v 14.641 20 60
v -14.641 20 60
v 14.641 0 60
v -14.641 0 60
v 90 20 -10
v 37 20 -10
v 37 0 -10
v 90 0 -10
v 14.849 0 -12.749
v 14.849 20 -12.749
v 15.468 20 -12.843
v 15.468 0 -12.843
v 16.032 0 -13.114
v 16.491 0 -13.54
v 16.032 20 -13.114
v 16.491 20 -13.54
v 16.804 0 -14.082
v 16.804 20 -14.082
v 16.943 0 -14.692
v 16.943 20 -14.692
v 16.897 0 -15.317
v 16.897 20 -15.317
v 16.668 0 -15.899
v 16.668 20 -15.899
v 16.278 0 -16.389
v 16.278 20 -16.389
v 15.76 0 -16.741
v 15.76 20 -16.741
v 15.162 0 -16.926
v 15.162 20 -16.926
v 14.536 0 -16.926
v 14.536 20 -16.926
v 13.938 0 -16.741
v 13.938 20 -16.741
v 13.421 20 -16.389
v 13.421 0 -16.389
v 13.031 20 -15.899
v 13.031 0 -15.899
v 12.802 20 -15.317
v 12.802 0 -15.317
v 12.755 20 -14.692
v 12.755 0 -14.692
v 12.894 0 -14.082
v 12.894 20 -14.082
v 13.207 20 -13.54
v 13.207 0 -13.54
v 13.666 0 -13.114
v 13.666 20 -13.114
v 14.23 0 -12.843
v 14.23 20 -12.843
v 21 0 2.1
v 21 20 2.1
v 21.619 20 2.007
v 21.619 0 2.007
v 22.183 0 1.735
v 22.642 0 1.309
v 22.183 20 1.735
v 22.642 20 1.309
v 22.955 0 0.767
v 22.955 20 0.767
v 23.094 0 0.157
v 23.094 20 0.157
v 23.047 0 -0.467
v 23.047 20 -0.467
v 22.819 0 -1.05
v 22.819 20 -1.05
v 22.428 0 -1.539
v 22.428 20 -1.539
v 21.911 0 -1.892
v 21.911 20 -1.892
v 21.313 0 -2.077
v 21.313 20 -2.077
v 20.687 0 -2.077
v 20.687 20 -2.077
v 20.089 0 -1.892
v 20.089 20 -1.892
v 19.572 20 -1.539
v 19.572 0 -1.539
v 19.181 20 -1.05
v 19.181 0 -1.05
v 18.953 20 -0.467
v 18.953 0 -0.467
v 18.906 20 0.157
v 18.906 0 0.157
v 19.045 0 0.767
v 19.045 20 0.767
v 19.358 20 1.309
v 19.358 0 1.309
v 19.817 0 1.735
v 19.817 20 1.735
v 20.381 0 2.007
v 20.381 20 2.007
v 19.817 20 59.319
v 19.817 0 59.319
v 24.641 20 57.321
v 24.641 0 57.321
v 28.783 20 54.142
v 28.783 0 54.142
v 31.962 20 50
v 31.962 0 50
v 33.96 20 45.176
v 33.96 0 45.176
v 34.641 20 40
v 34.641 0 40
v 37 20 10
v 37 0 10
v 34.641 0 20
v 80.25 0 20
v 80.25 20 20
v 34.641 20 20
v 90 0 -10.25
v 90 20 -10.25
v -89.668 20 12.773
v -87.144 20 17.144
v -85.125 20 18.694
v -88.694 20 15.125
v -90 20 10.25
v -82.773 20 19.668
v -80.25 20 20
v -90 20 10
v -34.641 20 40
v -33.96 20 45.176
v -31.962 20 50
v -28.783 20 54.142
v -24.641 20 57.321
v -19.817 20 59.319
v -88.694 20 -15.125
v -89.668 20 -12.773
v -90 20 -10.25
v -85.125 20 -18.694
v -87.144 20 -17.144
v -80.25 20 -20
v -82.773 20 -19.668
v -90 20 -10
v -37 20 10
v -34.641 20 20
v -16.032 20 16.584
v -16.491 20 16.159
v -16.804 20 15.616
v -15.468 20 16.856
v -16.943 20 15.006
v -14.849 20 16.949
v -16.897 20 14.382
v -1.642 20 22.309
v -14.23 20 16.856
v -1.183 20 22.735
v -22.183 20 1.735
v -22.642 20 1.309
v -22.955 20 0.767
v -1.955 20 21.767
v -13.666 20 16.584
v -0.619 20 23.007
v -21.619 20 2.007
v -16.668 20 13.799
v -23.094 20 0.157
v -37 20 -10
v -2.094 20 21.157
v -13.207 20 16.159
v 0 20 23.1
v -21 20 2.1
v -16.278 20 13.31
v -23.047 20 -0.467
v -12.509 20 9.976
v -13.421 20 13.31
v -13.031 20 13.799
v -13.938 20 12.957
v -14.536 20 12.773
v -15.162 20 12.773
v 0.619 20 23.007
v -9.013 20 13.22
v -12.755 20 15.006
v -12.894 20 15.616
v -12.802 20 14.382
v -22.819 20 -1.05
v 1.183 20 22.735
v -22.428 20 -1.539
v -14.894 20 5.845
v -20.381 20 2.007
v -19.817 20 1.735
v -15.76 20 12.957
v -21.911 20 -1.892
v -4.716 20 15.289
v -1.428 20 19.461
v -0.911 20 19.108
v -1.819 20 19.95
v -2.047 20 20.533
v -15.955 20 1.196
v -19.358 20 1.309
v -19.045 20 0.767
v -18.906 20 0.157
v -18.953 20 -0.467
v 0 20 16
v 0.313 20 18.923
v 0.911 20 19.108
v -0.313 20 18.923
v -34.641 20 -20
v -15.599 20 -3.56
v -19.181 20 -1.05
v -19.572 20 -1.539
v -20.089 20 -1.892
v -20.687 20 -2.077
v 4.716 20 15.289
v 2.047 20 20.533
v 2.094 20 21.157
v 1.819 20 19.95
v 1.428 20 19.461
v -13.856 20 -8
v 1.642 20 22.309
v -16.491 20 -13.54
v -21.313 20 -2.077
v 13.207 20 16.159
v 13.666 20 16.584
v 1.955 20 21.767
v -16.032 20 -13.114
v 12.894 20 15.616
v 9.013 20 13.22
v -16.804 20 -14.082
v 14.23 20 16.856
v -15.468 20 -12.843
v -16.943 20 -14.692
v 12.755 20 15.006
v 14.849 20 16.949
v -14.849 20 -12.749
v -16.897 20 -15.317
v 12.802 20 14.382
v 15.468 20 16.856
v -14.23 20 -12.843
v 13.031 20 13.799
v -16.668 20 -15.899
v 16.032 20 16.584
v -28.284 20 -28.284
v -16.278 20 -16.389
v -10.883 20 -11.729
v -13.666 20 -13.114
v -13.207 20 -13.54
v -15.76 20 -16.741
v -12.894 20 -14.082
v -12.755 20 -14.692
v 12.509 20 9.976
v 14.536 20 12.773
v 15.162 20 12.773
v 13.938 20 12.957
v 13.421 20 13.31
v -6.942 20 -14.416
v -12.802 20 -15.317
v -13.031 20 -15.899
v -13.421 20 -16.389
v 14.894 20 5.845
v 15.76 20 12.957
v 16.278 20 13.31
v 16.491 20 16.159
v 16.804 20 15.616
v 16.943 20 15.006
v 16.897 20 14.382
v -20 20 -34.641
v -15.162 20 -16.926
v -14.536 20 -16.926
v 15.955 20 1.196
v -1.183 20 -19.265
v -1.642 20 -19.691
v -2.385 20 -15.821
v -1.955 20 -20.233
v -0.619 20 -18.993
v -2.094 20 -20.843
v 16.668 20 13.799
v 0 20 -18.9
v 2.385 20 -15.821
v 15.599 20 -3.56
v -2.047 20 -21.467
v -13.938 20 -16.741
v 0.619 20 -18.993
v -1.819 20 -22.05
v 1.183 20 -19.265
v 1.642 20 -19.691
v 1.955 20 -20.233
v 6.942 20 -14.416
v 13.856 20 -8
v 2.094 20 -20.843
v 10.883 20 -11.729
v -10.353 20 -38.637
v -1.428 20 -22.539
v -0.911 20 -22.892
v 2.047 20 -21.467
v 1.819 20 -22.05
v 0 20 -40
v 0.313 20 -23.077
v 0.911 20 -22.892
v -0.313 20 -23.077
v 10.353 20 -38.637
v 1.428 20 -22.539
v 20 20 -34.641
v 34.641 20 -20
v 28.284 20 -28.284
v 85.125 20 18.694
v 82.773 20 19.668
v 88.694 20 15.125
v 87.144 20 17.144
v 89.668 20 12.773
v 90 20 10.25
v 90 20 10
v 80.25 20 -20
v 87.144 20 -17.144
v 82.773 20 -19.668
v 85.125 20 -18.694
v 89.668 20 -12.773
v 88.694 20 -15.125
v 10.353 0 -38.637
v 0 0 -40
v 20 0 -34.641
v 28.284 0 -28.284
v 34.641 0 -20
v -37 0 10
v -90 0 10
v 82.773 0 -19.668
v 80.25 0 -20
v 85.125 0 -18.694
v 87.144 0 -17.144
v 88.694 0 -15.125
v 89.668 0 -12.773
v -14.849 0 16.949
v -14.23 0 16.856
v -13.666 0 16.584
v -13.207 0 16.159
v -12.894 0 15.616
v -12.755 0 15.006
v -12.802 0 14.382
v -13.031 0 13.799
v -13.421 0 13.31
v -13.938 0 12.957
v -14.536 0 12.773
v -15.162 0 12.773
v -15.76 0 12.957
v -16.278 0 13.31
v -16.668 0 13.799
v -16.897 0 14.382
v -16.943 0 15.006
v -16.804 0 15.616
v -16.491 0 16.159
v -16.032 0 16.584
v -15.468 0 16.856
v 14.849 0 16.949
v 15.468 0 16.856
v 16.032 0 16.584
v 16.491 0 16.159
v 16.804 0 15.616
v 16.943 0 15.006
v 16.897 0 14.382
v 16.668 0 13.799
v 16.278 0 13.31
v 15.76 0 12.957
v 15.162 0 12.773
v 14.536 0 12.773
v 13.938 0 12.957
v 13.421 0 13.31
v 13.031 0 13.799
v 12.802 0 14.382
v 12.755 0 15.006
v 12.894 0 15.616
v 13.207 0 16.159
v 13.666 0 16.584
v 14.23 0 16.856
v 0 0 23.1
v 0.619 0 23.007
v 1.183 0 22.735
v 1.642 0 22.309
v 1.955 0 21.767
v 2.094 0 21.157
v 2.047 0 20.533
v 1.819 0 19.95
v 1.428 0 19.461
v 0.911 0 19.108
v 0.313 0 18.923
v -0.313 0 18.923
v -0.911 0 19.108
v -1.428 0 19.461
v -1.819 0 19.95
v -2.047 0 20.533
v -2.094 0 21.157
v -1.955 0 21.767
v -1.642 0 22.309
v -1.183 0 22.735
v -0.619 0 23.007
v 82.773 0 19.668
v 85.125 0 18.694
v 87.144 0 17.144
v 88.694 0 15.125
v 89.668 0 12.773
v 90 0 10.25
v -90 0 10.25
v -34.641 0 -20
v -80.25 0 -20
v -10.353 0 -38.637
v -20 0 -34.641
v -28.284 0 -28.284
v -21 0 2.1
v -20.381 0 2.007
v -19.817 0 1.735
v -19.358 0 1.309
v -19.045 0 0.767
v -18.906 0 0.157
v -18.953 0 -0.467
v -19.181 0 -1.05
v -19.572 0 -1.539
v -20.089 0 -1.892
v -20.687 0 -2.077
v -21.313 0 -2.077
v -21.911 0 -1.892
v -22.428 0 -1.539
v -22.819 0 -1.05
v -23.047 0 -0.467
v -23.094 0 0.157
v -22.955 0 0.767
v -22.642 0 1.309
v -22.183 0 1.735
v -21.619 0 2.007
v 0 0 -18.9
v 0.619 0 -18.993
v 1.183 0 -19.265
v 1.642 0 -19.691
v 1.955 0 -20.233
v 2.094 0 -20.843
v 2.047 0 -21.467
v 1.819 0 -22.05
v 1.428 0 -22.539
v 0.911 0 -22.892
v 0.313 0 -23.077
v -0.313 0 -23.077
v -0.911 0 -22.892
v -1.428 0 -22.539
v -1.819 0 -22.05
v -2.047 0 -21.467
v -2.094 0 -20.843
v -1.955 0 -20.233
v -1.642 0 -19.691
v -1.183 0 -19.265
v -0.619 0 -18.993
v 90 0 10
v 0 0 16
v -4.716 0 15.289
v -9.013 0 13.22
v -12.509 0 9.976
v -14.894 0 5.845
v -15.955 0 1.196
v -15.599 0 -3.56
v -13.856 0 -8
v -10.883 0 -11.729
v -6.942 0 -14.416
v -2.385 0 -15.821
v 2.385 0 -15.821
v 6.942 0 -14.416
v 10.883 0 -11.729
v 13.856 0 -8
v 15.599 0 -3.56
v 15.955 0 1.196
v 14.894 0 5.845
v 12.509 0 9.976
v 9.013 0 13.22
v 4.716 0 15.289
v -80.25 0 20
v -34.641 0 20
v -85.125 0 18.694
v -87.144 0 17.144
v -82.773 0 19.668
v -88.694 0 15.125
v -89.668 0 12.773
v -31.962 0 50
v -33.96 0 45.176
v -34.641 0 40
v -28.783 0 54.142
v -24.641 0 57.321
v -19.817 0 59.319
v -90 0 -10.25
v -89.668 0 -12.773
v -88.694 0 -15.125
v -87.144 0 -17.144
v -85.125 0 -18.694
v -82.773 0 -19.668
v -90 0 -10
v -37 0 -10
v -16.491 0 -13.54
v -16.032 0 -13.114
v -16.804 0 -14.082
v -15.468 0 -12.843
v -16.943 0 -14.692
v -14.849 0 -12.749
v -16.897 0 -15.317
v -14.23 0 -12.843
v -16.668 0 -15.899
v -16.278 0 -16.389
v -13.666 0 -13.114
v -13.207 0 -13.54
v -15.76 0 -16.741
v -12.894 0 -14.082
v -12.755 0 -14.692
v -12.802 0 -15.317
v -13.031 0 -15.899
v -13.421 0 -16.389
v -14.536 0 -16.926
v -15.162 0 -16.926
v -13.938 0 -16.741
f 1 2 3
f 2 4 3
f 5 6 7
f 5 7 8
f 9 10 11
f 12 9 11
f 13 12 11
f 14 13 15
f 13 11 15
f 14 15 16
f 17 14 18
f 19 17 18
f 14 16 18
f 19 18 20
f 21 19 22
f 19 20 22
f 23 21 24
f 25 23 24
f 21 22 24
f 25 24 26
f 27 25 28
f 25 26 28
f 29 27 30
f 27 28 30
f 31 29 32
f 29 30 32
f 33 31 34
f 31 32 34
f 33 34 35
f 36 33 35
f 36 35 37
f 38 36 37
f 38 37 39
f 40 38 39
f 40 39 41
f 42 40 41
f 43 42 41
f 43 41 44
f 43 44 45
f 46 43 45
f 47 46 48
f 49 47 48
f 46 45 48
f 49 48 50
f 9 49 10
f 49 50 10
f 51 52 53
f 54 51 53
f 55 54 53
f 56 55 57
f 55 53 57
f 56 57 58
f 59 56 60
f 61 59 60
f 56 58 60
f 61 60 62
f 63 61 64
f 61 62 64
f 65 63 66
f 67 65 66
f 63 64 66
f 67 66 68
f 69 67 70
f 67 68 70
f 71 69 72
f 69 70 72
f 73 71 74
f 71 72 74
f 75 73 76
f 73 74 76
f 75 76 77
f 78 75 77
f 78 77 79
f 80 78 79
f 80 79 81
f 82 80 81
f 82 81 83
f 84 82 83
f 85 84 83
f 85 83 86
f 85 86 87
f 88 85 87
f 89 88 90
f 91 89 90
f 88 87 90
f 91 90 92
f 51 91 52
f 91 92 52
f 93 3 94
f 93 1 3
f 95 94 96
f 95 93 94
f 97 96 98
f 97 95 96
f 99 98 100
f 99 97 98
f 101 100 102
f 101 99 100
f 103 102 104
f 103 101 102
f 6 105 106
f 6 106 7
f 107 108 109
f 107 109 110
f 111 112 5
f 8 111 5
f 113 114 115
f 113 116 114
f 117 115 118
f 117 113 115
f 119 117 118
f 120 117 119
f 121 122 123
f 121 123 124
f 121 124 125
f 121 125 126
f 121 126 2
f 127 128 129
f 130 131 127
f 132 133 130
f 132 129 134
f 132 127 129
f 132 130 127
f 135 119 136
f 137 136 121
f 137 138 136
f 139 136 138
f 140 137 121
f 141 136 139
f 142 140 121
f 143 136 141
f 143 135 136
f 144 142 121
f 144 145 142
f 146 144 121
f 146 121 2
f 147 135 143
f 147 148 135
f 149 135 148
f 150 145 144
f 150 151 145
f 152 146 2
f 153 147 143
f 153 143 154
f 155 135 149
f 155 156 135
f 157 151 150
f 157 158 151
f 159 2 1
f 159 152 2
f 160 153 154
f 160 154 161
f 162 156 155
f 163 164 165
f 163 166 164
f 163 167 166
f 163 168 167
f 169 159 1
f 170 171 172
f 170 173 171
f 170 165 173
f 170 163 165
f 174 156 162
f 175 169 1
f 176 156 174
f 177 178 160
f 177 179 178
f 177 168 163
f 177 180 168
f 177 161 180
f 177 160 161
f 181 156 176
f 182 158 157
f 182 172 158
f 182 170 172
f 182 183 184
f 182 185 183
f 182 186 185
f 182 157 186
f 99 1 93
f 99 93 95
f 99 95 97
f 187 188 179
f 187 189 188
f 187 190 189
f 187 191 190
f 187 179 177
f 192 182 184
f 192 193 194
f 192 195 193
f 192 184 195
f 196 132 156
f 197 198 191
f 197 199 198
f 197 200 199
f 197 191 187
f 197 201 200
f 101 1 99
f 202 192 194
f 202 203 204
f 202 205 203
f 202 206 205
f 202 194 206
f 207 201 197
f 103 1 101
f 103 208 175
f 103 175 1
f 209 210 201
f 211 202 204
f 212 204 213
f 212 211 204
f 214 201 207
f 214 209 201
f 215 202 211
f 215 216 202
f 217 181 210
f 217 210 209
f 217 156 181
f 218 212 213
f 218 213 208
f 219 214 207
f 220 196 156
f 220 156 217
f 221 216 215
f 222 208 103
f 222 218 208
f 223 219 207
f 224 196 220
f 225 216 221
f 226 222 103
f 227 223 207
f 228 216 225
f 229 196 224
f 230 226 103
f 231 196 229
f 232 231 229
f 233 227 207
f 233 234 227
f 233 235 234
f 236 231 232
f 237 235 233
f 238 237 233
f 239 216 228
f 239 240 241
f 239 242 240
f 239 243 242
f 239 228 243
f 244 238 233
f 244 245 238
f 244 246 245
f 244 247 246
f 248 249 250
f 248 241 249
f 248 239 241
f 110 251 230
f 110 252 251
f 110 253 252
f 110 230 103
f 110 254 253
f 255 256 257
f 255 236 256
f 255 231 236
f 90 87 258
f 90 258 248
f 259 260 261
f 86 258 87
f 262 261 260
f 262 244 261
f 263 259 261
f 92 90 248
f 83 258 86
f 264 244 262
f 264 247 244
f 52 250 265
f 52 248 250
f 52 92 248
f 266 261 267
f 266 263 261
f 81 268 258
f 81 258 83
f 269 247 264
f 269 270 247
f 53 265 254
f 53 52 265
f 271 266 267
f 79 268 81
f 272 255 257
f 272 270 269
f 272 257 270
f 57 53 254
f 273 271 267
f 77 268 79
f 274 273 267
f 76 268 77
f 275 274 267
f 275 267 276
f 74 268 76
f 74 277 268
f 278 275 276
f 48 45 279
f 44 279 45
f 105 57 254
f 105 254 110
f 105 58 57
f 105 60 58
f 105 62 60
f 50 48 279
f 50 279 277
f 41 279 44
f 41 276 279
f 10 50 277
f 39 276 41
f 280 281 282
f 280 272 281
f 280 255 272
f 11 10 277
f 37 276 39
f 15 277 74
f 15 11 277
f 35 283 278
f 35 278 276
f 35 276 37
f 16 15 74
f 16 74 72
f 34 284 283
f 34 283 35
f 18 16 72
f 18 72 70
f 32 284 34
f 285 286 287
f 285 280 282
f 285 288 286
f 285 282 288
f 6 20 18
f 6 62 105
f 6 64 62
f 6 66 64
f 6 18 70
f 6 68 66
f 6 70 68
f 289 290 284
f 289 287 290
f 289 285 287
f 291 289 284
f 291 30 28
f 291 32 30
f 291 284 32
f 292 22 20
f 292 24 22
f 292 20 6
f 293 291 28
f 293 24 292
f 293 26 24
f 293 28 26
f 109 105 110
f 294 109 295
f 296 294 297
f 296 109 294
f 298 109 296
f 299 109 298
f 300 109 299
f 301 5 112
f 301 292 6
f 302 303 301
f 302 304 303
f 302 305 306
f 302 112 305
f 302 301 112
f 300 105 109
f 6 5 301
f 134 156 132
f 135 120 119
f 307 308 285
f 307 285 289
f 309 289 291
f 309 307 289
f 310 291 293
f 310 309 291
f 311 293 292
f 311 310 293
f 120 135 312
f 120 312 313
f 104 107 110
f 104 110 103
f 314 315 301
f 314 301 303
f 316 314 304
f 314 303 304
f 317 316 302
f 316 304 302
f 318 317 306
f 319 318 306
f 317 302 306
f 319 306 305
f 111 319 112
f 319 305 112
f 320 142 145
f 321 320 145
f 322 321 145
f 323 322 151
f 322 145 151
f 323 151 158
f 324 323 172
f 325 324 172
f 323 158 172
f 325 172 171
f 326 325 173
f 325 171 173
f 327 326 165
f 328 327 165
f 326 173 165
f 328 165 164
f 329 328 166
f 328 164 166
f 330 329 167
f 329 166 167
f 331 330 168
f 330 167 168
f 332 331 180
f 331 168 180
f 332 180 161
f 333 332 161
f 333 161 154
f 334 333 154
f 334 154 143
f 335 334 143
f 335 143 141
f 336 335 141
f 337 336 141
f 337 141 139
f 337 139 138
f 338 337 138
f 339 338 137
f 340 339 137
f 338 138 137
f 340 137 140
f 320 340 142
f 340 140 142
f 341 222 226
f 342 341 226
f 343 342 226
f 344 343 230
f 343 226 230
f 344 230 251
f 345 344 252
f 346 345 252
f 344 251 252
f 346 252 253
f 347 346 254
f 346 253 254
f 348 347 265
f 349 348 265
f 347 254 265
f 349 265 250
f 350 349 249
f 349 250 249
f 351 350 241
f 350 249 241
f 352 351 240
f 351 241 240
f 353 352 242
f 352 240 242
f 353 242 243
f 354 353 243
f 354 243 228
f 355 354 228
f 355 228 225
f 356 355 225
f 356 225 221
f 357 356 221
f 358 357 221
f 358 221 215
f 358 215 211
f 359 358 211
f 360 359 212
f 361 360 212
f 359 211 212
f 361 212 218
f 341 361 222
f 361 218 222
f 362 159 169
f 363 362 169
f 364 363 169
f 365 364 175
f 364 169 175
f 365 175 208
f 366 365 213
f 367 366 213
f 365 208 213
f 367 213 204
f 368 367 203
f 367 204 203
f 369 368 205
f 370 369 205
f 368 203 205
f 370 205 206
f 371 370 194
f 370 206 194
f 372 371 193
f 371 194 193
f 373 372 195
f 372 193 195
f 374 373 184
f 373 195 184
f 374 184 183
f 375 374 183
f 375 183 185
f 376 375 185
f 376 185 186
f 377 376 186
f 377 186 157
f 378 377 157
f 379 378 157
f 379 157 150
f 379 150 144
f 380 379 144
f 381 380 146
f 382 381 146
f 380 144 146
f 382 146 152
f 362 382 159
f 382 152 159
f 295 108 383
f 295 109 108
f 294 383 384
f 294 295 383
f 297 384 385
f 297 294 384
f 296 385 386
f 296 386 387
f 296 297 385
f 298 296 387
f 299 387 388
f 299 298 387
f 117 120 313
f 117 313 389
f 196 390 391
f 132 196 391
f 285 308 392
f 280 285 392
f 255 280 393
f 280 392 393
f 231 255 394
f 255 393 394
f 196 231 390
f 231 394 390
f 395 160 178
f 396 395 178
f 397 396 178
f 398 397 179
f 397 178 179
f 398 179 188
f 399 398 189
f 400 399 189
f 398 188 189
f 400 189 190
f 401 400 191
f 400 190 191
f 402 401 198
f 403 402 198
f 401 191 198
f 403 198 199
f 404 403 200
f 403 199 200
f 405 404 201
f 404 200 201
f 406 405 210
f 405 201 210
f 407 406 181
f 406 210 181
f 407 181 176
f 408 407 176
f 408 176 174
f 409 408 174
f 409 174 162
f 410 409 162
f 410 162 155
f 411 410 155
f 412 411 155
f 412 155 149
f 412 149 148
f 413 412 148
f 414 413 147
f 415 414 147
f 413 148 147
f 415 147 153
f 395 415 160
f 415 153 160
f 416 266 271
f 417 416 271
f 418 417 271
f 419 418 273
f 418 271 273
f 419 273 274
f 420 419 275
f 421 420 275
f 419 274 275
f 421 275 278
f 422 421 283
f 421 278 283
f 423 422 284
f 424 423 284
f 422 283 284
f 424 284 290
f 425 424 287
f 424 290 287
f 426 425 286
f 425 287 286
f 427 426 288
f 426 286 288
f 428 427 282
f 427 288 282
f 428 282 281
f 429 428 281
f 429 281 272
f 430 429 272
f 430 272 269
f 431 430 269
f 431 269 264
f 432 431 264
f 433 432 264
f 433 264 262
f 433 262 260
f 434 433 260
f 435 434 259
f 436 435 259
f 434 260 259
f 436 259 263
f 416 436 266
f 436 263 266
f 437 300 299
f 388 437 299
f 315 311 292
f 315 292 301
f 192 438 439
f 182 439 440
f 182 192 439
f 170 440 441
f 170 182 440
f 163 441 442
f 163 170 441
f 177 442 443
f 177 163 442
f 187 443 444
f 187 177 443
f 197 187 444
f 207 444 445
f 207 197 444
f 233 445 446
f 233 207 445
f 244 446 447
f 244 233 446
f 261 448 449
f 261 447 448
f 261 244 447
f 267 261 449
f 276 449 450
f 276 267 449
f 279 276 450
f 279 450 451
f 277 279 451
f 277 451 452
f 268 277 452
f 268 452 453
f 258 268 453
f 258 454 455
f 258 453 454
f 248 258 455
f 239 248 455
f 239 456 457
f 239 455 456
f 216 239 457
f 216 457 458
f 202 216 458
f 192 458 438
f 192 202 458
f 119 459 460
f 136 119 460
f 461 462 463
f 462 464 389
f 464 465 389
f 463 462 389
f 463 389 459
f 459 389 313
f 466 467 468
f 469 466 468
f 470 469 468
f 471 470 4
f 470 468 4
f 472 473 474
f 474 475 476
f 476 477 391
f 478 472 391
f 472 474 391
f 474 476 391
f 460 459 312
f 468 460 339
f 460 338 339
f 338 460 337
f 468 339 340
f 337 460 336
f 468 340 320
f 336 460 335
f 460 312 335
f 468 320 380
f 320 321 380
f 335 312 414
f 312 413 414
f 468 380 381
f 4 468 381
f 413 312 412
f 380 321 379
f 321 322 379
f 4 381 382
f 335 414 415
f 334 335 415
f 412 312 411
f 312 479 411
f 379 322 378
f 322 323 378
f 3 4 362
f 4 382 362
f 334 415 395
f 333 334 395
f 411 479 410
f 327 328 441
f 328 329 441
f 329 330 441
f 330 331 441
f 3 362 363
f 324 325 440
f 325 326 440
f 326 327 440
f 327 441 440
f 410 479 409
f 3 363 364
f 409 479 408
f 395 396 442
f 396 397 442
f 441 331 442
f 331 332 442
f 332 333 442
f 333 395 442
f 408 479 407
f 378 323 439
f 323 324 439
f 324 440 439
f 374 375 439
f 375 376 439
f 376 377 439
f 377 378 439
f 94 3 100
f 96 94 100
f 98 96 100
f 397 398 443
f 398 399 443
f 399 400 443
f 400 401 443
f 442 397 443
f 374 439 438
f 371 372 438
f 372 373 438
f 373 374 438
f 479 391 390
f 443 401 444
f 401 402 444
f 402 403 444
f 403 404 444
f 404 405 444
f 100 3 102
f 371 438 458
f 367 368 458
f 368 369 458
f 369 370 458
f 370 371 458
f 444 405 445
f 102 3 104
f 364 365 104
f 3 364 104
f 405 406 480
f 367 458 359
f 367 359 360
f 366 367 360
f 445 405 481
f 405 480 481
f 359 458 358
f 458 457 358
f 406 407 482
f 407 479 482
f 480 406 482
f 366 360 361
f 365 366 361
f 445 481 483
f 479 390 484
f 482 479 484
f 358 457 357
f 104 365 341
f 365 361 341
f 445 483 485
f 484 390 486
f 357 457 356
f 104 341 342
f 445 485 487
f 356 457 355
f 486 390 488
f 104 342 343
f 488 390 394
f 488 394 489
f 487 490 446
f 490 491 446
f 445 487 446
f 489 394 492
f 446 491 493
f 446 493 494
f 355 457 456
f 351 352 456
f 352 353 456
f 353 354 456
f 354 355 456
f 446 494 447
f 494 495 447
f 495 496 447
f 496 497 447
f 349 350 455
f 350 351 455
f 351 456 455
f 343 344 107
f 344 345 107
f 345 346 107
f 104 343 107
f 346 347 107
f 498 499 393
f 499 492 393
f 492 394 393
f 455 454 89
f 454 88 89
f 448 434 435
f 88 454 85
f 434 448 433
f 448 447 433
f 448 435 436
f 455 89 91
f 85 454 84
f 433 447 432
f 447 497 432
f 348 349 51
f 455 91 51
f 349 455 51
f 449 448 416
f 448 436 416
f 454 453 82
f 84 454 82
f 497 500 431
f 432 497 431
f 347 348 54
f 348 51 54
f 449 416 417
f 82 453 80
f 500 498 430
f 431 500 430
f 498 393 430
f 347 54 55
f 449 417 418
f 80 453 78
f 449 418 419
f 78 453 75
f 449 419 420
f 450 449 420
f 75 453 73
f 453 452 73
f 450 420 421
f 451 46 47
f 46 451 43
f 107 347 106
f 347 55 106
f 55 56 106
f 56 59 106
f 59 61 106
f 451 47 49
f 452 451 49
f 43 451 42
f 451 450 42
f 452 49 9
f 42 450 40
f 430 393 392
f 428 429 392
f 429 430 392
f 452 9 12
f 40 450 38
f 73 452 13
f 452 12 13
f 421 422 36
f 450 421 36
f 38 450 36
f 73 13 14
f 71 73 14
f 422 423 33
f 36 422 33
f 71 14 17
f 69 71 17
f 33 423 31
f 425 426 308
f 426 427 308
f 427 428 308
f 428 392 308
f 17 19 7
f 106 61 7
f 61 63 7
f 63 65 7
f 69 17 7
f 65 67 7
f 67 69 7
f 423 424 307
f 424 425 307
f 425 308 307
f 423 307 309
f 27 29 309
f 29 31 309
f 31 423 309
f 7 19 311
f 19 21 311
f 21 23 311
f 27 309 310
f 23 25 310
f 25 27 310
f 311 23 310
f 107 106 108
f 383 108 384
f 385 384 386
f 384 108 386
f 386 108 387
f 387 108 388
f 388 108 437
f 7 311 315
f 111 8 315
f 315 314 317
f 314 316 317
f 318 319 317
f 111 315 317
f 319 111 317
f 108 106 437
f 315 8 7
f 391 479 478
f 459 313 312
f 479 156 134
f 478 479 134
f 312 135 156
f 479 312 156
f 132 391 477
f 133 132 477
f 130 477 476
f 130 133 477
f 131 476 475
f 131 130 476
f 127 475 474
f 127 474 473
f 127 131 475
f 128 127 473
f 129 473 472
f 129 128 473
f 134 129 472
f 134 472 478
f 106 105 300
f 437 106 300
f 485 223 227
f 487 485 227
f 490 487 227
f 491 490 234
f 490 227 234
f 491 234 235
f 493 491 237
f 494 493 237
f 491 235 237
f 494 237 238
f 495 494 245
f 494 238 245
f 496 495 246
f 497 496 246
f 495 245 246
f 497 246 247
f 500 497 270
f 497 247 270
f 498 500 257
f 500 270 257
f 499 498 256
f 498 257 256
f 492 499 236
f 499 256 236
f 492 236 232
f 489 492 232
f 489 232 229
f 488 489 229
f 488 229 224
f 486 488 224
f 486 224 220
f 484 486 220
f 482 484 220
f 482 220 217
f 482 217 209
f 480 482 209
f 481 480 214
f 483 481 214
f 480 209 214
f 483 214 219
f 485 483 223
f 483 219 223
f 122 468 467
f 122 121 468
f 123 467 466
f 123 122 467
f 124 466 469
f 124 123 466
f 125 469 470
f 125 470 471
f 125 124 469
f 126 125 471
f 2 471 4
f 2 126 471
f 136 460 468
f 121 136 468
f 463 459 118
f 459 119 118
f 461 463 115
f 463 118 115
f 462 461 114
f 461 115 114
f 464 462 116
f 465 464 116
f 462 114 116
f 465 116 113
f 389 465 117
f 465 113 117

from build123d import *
from build123d.topology import SkipClean

# Parameters (mm, degrees)
BOSS_EXTRUDE1_DEPTH  = 20
SKETCH2_W            = 53
SKETCH2_H            = 20
CUT_EXTRUDE1_DEPTH   = 20
FILLET1_R            = 9.75
FILLET1_OF_MIRROR4_R = 9.75
SKETCH4_R            = 2.1
CUT_EXTRUDE3_DEPTH   = 20
FILLET2_R            = 20


with BuildPart() as part:
    # Sketch1 → Boss-Extrude1 (new body)
    with BuildSketch(Plane(origin=(0, 0, 0), x_dir=(1, 0, 0), z_dir=(0, 1, 0))):
        with BuildLine():
            Line((34.641016151, 20), (90, 20))
            Line((90, 20), (90, -20))
            Line((90, -20), (34.641016151, -20))
            Line((34.641016151, -20), (34.641016151, -60))
            Line((34.641016151, -60), (0, -60))
            Line((0, -60), (0, -20))
            Line((0, -20), (0, 20))
            Line((0, 20), (0, 40))
            ThreePointArc((0, 40), (20, 34.641016151), (34.641016151, 20))
        make_face()
    boss_extrude1 = extrude(amount=BOSS_EXTRUDE1_DEPTH)

    # Sketch2 → Cut-Extrude1 (cut)
    with BuildSketch(Plane(origin=(0, 20, 0), x_dir=(1, 0, 0), z_dir=(0, 1, 0))):
        with BuildLine():
            Line((0, 16), (0, -16))
            ThreePointArc((0, -16), (16, 0), (0, 16))
        make_face()
        with Locations((63.5, 0)):
            Rectangle(SKETCH2_W, SKETCH2_H)
    cut_extrude1 = extrude(amount=-CUT_EXTRUDE1_DEPTH, mode=Mode.SUBTRACT)

    # Fillet1
    fillet1_edges = [part.edges().sort_by_distance(p)[0] for p in [
        (90, 10, -20),
        (90, 10, 20),
    ]]
    fillet(fillet1_edges, radius=FILLET1_R)

    # Mirror4: Boss-Extrude1, Cut-Extrude1 across plane
    with SkipClean():  # the faces are left unmerged after this step: merging them gives an invalid solid
        add(boss_extrude1.mirror(Plane(origin=(0, 0, 0), x_dir=(0, 0, 1), z_dir=(1, 0, 0))))
        add(cut_extrude1.mirror(Plane(origin=(0, 0, 0), x_dir=(0, 0, 1), z_dir=(1, 0, 0))), mode=Mode.SUBTRACT)
    add(part.part.scale(1), mode=Mode.REPLACE)  # the faces are merged on a copy

    # Fillet1 of Mirror4
    fillet1_of_mirror4_edges = [part.edges().sort_by_distance(p)[0] for p in [
        (-90, 10, -20),
        (-90, 10, 20),
    ]]
    fillet(fillet1_of_mirror4_edges, radius=FILLET1_OF_MIRROR4_R)

    # Sketch4 → Cut-Extrude3 (cut)
    with BuildSketch(Plane(origin=(0, 20, 0), x_dir=(1, 0, 0), z_dir=(0, 1, 0))):
        with Locations(Location((21, 0, 0), (0, 0, 270))):
            Circle(SKETCH4_R)
        with Locations(Location((14.849242405, -14.849242405, 0), (0, 0, 270))):
            Circle(SKETCH4_R)
        with Locations(Location((0, -21, 0), (0, 0, 270))):
            Circle(SKETCH4_R)
        with Locations(Location((-14.849242405, -14.849242405, 0), (0, 0, 270))):
            Circle(SKETCH4_R)
        with Locations(Location((-21, 0, 0), (0, 0, 270))):
            Circle(SKETCH4_R)
        with Locations(Location((-14.849242405, 14.849242405, 0), (0, 0, 270))):
            Circle(SKETCH4_R)
        with Locations(Location((0, 21, 0), (0, 0, 270))):
            Circle(SKETCH4_R)
        with Locations(Location((14.849242405, 14.849242405, 0), (0, 0, 270))):
            Circle(SKETCH4_R)
    extrude(amount=-CUT_EXTRUDE3_DEPTH, mode=Mode.SUBTRACT)

    # Fillet2
    fillet2_edges = [part.edges().sort_by_distance(p)[0] for p in [
        (34.641016151, 10, 60),
        (-34.641016151, 10, 60),
    ]]
    fillet(fillet2_edges, radius=FILLET2_R)


solid = part.part
